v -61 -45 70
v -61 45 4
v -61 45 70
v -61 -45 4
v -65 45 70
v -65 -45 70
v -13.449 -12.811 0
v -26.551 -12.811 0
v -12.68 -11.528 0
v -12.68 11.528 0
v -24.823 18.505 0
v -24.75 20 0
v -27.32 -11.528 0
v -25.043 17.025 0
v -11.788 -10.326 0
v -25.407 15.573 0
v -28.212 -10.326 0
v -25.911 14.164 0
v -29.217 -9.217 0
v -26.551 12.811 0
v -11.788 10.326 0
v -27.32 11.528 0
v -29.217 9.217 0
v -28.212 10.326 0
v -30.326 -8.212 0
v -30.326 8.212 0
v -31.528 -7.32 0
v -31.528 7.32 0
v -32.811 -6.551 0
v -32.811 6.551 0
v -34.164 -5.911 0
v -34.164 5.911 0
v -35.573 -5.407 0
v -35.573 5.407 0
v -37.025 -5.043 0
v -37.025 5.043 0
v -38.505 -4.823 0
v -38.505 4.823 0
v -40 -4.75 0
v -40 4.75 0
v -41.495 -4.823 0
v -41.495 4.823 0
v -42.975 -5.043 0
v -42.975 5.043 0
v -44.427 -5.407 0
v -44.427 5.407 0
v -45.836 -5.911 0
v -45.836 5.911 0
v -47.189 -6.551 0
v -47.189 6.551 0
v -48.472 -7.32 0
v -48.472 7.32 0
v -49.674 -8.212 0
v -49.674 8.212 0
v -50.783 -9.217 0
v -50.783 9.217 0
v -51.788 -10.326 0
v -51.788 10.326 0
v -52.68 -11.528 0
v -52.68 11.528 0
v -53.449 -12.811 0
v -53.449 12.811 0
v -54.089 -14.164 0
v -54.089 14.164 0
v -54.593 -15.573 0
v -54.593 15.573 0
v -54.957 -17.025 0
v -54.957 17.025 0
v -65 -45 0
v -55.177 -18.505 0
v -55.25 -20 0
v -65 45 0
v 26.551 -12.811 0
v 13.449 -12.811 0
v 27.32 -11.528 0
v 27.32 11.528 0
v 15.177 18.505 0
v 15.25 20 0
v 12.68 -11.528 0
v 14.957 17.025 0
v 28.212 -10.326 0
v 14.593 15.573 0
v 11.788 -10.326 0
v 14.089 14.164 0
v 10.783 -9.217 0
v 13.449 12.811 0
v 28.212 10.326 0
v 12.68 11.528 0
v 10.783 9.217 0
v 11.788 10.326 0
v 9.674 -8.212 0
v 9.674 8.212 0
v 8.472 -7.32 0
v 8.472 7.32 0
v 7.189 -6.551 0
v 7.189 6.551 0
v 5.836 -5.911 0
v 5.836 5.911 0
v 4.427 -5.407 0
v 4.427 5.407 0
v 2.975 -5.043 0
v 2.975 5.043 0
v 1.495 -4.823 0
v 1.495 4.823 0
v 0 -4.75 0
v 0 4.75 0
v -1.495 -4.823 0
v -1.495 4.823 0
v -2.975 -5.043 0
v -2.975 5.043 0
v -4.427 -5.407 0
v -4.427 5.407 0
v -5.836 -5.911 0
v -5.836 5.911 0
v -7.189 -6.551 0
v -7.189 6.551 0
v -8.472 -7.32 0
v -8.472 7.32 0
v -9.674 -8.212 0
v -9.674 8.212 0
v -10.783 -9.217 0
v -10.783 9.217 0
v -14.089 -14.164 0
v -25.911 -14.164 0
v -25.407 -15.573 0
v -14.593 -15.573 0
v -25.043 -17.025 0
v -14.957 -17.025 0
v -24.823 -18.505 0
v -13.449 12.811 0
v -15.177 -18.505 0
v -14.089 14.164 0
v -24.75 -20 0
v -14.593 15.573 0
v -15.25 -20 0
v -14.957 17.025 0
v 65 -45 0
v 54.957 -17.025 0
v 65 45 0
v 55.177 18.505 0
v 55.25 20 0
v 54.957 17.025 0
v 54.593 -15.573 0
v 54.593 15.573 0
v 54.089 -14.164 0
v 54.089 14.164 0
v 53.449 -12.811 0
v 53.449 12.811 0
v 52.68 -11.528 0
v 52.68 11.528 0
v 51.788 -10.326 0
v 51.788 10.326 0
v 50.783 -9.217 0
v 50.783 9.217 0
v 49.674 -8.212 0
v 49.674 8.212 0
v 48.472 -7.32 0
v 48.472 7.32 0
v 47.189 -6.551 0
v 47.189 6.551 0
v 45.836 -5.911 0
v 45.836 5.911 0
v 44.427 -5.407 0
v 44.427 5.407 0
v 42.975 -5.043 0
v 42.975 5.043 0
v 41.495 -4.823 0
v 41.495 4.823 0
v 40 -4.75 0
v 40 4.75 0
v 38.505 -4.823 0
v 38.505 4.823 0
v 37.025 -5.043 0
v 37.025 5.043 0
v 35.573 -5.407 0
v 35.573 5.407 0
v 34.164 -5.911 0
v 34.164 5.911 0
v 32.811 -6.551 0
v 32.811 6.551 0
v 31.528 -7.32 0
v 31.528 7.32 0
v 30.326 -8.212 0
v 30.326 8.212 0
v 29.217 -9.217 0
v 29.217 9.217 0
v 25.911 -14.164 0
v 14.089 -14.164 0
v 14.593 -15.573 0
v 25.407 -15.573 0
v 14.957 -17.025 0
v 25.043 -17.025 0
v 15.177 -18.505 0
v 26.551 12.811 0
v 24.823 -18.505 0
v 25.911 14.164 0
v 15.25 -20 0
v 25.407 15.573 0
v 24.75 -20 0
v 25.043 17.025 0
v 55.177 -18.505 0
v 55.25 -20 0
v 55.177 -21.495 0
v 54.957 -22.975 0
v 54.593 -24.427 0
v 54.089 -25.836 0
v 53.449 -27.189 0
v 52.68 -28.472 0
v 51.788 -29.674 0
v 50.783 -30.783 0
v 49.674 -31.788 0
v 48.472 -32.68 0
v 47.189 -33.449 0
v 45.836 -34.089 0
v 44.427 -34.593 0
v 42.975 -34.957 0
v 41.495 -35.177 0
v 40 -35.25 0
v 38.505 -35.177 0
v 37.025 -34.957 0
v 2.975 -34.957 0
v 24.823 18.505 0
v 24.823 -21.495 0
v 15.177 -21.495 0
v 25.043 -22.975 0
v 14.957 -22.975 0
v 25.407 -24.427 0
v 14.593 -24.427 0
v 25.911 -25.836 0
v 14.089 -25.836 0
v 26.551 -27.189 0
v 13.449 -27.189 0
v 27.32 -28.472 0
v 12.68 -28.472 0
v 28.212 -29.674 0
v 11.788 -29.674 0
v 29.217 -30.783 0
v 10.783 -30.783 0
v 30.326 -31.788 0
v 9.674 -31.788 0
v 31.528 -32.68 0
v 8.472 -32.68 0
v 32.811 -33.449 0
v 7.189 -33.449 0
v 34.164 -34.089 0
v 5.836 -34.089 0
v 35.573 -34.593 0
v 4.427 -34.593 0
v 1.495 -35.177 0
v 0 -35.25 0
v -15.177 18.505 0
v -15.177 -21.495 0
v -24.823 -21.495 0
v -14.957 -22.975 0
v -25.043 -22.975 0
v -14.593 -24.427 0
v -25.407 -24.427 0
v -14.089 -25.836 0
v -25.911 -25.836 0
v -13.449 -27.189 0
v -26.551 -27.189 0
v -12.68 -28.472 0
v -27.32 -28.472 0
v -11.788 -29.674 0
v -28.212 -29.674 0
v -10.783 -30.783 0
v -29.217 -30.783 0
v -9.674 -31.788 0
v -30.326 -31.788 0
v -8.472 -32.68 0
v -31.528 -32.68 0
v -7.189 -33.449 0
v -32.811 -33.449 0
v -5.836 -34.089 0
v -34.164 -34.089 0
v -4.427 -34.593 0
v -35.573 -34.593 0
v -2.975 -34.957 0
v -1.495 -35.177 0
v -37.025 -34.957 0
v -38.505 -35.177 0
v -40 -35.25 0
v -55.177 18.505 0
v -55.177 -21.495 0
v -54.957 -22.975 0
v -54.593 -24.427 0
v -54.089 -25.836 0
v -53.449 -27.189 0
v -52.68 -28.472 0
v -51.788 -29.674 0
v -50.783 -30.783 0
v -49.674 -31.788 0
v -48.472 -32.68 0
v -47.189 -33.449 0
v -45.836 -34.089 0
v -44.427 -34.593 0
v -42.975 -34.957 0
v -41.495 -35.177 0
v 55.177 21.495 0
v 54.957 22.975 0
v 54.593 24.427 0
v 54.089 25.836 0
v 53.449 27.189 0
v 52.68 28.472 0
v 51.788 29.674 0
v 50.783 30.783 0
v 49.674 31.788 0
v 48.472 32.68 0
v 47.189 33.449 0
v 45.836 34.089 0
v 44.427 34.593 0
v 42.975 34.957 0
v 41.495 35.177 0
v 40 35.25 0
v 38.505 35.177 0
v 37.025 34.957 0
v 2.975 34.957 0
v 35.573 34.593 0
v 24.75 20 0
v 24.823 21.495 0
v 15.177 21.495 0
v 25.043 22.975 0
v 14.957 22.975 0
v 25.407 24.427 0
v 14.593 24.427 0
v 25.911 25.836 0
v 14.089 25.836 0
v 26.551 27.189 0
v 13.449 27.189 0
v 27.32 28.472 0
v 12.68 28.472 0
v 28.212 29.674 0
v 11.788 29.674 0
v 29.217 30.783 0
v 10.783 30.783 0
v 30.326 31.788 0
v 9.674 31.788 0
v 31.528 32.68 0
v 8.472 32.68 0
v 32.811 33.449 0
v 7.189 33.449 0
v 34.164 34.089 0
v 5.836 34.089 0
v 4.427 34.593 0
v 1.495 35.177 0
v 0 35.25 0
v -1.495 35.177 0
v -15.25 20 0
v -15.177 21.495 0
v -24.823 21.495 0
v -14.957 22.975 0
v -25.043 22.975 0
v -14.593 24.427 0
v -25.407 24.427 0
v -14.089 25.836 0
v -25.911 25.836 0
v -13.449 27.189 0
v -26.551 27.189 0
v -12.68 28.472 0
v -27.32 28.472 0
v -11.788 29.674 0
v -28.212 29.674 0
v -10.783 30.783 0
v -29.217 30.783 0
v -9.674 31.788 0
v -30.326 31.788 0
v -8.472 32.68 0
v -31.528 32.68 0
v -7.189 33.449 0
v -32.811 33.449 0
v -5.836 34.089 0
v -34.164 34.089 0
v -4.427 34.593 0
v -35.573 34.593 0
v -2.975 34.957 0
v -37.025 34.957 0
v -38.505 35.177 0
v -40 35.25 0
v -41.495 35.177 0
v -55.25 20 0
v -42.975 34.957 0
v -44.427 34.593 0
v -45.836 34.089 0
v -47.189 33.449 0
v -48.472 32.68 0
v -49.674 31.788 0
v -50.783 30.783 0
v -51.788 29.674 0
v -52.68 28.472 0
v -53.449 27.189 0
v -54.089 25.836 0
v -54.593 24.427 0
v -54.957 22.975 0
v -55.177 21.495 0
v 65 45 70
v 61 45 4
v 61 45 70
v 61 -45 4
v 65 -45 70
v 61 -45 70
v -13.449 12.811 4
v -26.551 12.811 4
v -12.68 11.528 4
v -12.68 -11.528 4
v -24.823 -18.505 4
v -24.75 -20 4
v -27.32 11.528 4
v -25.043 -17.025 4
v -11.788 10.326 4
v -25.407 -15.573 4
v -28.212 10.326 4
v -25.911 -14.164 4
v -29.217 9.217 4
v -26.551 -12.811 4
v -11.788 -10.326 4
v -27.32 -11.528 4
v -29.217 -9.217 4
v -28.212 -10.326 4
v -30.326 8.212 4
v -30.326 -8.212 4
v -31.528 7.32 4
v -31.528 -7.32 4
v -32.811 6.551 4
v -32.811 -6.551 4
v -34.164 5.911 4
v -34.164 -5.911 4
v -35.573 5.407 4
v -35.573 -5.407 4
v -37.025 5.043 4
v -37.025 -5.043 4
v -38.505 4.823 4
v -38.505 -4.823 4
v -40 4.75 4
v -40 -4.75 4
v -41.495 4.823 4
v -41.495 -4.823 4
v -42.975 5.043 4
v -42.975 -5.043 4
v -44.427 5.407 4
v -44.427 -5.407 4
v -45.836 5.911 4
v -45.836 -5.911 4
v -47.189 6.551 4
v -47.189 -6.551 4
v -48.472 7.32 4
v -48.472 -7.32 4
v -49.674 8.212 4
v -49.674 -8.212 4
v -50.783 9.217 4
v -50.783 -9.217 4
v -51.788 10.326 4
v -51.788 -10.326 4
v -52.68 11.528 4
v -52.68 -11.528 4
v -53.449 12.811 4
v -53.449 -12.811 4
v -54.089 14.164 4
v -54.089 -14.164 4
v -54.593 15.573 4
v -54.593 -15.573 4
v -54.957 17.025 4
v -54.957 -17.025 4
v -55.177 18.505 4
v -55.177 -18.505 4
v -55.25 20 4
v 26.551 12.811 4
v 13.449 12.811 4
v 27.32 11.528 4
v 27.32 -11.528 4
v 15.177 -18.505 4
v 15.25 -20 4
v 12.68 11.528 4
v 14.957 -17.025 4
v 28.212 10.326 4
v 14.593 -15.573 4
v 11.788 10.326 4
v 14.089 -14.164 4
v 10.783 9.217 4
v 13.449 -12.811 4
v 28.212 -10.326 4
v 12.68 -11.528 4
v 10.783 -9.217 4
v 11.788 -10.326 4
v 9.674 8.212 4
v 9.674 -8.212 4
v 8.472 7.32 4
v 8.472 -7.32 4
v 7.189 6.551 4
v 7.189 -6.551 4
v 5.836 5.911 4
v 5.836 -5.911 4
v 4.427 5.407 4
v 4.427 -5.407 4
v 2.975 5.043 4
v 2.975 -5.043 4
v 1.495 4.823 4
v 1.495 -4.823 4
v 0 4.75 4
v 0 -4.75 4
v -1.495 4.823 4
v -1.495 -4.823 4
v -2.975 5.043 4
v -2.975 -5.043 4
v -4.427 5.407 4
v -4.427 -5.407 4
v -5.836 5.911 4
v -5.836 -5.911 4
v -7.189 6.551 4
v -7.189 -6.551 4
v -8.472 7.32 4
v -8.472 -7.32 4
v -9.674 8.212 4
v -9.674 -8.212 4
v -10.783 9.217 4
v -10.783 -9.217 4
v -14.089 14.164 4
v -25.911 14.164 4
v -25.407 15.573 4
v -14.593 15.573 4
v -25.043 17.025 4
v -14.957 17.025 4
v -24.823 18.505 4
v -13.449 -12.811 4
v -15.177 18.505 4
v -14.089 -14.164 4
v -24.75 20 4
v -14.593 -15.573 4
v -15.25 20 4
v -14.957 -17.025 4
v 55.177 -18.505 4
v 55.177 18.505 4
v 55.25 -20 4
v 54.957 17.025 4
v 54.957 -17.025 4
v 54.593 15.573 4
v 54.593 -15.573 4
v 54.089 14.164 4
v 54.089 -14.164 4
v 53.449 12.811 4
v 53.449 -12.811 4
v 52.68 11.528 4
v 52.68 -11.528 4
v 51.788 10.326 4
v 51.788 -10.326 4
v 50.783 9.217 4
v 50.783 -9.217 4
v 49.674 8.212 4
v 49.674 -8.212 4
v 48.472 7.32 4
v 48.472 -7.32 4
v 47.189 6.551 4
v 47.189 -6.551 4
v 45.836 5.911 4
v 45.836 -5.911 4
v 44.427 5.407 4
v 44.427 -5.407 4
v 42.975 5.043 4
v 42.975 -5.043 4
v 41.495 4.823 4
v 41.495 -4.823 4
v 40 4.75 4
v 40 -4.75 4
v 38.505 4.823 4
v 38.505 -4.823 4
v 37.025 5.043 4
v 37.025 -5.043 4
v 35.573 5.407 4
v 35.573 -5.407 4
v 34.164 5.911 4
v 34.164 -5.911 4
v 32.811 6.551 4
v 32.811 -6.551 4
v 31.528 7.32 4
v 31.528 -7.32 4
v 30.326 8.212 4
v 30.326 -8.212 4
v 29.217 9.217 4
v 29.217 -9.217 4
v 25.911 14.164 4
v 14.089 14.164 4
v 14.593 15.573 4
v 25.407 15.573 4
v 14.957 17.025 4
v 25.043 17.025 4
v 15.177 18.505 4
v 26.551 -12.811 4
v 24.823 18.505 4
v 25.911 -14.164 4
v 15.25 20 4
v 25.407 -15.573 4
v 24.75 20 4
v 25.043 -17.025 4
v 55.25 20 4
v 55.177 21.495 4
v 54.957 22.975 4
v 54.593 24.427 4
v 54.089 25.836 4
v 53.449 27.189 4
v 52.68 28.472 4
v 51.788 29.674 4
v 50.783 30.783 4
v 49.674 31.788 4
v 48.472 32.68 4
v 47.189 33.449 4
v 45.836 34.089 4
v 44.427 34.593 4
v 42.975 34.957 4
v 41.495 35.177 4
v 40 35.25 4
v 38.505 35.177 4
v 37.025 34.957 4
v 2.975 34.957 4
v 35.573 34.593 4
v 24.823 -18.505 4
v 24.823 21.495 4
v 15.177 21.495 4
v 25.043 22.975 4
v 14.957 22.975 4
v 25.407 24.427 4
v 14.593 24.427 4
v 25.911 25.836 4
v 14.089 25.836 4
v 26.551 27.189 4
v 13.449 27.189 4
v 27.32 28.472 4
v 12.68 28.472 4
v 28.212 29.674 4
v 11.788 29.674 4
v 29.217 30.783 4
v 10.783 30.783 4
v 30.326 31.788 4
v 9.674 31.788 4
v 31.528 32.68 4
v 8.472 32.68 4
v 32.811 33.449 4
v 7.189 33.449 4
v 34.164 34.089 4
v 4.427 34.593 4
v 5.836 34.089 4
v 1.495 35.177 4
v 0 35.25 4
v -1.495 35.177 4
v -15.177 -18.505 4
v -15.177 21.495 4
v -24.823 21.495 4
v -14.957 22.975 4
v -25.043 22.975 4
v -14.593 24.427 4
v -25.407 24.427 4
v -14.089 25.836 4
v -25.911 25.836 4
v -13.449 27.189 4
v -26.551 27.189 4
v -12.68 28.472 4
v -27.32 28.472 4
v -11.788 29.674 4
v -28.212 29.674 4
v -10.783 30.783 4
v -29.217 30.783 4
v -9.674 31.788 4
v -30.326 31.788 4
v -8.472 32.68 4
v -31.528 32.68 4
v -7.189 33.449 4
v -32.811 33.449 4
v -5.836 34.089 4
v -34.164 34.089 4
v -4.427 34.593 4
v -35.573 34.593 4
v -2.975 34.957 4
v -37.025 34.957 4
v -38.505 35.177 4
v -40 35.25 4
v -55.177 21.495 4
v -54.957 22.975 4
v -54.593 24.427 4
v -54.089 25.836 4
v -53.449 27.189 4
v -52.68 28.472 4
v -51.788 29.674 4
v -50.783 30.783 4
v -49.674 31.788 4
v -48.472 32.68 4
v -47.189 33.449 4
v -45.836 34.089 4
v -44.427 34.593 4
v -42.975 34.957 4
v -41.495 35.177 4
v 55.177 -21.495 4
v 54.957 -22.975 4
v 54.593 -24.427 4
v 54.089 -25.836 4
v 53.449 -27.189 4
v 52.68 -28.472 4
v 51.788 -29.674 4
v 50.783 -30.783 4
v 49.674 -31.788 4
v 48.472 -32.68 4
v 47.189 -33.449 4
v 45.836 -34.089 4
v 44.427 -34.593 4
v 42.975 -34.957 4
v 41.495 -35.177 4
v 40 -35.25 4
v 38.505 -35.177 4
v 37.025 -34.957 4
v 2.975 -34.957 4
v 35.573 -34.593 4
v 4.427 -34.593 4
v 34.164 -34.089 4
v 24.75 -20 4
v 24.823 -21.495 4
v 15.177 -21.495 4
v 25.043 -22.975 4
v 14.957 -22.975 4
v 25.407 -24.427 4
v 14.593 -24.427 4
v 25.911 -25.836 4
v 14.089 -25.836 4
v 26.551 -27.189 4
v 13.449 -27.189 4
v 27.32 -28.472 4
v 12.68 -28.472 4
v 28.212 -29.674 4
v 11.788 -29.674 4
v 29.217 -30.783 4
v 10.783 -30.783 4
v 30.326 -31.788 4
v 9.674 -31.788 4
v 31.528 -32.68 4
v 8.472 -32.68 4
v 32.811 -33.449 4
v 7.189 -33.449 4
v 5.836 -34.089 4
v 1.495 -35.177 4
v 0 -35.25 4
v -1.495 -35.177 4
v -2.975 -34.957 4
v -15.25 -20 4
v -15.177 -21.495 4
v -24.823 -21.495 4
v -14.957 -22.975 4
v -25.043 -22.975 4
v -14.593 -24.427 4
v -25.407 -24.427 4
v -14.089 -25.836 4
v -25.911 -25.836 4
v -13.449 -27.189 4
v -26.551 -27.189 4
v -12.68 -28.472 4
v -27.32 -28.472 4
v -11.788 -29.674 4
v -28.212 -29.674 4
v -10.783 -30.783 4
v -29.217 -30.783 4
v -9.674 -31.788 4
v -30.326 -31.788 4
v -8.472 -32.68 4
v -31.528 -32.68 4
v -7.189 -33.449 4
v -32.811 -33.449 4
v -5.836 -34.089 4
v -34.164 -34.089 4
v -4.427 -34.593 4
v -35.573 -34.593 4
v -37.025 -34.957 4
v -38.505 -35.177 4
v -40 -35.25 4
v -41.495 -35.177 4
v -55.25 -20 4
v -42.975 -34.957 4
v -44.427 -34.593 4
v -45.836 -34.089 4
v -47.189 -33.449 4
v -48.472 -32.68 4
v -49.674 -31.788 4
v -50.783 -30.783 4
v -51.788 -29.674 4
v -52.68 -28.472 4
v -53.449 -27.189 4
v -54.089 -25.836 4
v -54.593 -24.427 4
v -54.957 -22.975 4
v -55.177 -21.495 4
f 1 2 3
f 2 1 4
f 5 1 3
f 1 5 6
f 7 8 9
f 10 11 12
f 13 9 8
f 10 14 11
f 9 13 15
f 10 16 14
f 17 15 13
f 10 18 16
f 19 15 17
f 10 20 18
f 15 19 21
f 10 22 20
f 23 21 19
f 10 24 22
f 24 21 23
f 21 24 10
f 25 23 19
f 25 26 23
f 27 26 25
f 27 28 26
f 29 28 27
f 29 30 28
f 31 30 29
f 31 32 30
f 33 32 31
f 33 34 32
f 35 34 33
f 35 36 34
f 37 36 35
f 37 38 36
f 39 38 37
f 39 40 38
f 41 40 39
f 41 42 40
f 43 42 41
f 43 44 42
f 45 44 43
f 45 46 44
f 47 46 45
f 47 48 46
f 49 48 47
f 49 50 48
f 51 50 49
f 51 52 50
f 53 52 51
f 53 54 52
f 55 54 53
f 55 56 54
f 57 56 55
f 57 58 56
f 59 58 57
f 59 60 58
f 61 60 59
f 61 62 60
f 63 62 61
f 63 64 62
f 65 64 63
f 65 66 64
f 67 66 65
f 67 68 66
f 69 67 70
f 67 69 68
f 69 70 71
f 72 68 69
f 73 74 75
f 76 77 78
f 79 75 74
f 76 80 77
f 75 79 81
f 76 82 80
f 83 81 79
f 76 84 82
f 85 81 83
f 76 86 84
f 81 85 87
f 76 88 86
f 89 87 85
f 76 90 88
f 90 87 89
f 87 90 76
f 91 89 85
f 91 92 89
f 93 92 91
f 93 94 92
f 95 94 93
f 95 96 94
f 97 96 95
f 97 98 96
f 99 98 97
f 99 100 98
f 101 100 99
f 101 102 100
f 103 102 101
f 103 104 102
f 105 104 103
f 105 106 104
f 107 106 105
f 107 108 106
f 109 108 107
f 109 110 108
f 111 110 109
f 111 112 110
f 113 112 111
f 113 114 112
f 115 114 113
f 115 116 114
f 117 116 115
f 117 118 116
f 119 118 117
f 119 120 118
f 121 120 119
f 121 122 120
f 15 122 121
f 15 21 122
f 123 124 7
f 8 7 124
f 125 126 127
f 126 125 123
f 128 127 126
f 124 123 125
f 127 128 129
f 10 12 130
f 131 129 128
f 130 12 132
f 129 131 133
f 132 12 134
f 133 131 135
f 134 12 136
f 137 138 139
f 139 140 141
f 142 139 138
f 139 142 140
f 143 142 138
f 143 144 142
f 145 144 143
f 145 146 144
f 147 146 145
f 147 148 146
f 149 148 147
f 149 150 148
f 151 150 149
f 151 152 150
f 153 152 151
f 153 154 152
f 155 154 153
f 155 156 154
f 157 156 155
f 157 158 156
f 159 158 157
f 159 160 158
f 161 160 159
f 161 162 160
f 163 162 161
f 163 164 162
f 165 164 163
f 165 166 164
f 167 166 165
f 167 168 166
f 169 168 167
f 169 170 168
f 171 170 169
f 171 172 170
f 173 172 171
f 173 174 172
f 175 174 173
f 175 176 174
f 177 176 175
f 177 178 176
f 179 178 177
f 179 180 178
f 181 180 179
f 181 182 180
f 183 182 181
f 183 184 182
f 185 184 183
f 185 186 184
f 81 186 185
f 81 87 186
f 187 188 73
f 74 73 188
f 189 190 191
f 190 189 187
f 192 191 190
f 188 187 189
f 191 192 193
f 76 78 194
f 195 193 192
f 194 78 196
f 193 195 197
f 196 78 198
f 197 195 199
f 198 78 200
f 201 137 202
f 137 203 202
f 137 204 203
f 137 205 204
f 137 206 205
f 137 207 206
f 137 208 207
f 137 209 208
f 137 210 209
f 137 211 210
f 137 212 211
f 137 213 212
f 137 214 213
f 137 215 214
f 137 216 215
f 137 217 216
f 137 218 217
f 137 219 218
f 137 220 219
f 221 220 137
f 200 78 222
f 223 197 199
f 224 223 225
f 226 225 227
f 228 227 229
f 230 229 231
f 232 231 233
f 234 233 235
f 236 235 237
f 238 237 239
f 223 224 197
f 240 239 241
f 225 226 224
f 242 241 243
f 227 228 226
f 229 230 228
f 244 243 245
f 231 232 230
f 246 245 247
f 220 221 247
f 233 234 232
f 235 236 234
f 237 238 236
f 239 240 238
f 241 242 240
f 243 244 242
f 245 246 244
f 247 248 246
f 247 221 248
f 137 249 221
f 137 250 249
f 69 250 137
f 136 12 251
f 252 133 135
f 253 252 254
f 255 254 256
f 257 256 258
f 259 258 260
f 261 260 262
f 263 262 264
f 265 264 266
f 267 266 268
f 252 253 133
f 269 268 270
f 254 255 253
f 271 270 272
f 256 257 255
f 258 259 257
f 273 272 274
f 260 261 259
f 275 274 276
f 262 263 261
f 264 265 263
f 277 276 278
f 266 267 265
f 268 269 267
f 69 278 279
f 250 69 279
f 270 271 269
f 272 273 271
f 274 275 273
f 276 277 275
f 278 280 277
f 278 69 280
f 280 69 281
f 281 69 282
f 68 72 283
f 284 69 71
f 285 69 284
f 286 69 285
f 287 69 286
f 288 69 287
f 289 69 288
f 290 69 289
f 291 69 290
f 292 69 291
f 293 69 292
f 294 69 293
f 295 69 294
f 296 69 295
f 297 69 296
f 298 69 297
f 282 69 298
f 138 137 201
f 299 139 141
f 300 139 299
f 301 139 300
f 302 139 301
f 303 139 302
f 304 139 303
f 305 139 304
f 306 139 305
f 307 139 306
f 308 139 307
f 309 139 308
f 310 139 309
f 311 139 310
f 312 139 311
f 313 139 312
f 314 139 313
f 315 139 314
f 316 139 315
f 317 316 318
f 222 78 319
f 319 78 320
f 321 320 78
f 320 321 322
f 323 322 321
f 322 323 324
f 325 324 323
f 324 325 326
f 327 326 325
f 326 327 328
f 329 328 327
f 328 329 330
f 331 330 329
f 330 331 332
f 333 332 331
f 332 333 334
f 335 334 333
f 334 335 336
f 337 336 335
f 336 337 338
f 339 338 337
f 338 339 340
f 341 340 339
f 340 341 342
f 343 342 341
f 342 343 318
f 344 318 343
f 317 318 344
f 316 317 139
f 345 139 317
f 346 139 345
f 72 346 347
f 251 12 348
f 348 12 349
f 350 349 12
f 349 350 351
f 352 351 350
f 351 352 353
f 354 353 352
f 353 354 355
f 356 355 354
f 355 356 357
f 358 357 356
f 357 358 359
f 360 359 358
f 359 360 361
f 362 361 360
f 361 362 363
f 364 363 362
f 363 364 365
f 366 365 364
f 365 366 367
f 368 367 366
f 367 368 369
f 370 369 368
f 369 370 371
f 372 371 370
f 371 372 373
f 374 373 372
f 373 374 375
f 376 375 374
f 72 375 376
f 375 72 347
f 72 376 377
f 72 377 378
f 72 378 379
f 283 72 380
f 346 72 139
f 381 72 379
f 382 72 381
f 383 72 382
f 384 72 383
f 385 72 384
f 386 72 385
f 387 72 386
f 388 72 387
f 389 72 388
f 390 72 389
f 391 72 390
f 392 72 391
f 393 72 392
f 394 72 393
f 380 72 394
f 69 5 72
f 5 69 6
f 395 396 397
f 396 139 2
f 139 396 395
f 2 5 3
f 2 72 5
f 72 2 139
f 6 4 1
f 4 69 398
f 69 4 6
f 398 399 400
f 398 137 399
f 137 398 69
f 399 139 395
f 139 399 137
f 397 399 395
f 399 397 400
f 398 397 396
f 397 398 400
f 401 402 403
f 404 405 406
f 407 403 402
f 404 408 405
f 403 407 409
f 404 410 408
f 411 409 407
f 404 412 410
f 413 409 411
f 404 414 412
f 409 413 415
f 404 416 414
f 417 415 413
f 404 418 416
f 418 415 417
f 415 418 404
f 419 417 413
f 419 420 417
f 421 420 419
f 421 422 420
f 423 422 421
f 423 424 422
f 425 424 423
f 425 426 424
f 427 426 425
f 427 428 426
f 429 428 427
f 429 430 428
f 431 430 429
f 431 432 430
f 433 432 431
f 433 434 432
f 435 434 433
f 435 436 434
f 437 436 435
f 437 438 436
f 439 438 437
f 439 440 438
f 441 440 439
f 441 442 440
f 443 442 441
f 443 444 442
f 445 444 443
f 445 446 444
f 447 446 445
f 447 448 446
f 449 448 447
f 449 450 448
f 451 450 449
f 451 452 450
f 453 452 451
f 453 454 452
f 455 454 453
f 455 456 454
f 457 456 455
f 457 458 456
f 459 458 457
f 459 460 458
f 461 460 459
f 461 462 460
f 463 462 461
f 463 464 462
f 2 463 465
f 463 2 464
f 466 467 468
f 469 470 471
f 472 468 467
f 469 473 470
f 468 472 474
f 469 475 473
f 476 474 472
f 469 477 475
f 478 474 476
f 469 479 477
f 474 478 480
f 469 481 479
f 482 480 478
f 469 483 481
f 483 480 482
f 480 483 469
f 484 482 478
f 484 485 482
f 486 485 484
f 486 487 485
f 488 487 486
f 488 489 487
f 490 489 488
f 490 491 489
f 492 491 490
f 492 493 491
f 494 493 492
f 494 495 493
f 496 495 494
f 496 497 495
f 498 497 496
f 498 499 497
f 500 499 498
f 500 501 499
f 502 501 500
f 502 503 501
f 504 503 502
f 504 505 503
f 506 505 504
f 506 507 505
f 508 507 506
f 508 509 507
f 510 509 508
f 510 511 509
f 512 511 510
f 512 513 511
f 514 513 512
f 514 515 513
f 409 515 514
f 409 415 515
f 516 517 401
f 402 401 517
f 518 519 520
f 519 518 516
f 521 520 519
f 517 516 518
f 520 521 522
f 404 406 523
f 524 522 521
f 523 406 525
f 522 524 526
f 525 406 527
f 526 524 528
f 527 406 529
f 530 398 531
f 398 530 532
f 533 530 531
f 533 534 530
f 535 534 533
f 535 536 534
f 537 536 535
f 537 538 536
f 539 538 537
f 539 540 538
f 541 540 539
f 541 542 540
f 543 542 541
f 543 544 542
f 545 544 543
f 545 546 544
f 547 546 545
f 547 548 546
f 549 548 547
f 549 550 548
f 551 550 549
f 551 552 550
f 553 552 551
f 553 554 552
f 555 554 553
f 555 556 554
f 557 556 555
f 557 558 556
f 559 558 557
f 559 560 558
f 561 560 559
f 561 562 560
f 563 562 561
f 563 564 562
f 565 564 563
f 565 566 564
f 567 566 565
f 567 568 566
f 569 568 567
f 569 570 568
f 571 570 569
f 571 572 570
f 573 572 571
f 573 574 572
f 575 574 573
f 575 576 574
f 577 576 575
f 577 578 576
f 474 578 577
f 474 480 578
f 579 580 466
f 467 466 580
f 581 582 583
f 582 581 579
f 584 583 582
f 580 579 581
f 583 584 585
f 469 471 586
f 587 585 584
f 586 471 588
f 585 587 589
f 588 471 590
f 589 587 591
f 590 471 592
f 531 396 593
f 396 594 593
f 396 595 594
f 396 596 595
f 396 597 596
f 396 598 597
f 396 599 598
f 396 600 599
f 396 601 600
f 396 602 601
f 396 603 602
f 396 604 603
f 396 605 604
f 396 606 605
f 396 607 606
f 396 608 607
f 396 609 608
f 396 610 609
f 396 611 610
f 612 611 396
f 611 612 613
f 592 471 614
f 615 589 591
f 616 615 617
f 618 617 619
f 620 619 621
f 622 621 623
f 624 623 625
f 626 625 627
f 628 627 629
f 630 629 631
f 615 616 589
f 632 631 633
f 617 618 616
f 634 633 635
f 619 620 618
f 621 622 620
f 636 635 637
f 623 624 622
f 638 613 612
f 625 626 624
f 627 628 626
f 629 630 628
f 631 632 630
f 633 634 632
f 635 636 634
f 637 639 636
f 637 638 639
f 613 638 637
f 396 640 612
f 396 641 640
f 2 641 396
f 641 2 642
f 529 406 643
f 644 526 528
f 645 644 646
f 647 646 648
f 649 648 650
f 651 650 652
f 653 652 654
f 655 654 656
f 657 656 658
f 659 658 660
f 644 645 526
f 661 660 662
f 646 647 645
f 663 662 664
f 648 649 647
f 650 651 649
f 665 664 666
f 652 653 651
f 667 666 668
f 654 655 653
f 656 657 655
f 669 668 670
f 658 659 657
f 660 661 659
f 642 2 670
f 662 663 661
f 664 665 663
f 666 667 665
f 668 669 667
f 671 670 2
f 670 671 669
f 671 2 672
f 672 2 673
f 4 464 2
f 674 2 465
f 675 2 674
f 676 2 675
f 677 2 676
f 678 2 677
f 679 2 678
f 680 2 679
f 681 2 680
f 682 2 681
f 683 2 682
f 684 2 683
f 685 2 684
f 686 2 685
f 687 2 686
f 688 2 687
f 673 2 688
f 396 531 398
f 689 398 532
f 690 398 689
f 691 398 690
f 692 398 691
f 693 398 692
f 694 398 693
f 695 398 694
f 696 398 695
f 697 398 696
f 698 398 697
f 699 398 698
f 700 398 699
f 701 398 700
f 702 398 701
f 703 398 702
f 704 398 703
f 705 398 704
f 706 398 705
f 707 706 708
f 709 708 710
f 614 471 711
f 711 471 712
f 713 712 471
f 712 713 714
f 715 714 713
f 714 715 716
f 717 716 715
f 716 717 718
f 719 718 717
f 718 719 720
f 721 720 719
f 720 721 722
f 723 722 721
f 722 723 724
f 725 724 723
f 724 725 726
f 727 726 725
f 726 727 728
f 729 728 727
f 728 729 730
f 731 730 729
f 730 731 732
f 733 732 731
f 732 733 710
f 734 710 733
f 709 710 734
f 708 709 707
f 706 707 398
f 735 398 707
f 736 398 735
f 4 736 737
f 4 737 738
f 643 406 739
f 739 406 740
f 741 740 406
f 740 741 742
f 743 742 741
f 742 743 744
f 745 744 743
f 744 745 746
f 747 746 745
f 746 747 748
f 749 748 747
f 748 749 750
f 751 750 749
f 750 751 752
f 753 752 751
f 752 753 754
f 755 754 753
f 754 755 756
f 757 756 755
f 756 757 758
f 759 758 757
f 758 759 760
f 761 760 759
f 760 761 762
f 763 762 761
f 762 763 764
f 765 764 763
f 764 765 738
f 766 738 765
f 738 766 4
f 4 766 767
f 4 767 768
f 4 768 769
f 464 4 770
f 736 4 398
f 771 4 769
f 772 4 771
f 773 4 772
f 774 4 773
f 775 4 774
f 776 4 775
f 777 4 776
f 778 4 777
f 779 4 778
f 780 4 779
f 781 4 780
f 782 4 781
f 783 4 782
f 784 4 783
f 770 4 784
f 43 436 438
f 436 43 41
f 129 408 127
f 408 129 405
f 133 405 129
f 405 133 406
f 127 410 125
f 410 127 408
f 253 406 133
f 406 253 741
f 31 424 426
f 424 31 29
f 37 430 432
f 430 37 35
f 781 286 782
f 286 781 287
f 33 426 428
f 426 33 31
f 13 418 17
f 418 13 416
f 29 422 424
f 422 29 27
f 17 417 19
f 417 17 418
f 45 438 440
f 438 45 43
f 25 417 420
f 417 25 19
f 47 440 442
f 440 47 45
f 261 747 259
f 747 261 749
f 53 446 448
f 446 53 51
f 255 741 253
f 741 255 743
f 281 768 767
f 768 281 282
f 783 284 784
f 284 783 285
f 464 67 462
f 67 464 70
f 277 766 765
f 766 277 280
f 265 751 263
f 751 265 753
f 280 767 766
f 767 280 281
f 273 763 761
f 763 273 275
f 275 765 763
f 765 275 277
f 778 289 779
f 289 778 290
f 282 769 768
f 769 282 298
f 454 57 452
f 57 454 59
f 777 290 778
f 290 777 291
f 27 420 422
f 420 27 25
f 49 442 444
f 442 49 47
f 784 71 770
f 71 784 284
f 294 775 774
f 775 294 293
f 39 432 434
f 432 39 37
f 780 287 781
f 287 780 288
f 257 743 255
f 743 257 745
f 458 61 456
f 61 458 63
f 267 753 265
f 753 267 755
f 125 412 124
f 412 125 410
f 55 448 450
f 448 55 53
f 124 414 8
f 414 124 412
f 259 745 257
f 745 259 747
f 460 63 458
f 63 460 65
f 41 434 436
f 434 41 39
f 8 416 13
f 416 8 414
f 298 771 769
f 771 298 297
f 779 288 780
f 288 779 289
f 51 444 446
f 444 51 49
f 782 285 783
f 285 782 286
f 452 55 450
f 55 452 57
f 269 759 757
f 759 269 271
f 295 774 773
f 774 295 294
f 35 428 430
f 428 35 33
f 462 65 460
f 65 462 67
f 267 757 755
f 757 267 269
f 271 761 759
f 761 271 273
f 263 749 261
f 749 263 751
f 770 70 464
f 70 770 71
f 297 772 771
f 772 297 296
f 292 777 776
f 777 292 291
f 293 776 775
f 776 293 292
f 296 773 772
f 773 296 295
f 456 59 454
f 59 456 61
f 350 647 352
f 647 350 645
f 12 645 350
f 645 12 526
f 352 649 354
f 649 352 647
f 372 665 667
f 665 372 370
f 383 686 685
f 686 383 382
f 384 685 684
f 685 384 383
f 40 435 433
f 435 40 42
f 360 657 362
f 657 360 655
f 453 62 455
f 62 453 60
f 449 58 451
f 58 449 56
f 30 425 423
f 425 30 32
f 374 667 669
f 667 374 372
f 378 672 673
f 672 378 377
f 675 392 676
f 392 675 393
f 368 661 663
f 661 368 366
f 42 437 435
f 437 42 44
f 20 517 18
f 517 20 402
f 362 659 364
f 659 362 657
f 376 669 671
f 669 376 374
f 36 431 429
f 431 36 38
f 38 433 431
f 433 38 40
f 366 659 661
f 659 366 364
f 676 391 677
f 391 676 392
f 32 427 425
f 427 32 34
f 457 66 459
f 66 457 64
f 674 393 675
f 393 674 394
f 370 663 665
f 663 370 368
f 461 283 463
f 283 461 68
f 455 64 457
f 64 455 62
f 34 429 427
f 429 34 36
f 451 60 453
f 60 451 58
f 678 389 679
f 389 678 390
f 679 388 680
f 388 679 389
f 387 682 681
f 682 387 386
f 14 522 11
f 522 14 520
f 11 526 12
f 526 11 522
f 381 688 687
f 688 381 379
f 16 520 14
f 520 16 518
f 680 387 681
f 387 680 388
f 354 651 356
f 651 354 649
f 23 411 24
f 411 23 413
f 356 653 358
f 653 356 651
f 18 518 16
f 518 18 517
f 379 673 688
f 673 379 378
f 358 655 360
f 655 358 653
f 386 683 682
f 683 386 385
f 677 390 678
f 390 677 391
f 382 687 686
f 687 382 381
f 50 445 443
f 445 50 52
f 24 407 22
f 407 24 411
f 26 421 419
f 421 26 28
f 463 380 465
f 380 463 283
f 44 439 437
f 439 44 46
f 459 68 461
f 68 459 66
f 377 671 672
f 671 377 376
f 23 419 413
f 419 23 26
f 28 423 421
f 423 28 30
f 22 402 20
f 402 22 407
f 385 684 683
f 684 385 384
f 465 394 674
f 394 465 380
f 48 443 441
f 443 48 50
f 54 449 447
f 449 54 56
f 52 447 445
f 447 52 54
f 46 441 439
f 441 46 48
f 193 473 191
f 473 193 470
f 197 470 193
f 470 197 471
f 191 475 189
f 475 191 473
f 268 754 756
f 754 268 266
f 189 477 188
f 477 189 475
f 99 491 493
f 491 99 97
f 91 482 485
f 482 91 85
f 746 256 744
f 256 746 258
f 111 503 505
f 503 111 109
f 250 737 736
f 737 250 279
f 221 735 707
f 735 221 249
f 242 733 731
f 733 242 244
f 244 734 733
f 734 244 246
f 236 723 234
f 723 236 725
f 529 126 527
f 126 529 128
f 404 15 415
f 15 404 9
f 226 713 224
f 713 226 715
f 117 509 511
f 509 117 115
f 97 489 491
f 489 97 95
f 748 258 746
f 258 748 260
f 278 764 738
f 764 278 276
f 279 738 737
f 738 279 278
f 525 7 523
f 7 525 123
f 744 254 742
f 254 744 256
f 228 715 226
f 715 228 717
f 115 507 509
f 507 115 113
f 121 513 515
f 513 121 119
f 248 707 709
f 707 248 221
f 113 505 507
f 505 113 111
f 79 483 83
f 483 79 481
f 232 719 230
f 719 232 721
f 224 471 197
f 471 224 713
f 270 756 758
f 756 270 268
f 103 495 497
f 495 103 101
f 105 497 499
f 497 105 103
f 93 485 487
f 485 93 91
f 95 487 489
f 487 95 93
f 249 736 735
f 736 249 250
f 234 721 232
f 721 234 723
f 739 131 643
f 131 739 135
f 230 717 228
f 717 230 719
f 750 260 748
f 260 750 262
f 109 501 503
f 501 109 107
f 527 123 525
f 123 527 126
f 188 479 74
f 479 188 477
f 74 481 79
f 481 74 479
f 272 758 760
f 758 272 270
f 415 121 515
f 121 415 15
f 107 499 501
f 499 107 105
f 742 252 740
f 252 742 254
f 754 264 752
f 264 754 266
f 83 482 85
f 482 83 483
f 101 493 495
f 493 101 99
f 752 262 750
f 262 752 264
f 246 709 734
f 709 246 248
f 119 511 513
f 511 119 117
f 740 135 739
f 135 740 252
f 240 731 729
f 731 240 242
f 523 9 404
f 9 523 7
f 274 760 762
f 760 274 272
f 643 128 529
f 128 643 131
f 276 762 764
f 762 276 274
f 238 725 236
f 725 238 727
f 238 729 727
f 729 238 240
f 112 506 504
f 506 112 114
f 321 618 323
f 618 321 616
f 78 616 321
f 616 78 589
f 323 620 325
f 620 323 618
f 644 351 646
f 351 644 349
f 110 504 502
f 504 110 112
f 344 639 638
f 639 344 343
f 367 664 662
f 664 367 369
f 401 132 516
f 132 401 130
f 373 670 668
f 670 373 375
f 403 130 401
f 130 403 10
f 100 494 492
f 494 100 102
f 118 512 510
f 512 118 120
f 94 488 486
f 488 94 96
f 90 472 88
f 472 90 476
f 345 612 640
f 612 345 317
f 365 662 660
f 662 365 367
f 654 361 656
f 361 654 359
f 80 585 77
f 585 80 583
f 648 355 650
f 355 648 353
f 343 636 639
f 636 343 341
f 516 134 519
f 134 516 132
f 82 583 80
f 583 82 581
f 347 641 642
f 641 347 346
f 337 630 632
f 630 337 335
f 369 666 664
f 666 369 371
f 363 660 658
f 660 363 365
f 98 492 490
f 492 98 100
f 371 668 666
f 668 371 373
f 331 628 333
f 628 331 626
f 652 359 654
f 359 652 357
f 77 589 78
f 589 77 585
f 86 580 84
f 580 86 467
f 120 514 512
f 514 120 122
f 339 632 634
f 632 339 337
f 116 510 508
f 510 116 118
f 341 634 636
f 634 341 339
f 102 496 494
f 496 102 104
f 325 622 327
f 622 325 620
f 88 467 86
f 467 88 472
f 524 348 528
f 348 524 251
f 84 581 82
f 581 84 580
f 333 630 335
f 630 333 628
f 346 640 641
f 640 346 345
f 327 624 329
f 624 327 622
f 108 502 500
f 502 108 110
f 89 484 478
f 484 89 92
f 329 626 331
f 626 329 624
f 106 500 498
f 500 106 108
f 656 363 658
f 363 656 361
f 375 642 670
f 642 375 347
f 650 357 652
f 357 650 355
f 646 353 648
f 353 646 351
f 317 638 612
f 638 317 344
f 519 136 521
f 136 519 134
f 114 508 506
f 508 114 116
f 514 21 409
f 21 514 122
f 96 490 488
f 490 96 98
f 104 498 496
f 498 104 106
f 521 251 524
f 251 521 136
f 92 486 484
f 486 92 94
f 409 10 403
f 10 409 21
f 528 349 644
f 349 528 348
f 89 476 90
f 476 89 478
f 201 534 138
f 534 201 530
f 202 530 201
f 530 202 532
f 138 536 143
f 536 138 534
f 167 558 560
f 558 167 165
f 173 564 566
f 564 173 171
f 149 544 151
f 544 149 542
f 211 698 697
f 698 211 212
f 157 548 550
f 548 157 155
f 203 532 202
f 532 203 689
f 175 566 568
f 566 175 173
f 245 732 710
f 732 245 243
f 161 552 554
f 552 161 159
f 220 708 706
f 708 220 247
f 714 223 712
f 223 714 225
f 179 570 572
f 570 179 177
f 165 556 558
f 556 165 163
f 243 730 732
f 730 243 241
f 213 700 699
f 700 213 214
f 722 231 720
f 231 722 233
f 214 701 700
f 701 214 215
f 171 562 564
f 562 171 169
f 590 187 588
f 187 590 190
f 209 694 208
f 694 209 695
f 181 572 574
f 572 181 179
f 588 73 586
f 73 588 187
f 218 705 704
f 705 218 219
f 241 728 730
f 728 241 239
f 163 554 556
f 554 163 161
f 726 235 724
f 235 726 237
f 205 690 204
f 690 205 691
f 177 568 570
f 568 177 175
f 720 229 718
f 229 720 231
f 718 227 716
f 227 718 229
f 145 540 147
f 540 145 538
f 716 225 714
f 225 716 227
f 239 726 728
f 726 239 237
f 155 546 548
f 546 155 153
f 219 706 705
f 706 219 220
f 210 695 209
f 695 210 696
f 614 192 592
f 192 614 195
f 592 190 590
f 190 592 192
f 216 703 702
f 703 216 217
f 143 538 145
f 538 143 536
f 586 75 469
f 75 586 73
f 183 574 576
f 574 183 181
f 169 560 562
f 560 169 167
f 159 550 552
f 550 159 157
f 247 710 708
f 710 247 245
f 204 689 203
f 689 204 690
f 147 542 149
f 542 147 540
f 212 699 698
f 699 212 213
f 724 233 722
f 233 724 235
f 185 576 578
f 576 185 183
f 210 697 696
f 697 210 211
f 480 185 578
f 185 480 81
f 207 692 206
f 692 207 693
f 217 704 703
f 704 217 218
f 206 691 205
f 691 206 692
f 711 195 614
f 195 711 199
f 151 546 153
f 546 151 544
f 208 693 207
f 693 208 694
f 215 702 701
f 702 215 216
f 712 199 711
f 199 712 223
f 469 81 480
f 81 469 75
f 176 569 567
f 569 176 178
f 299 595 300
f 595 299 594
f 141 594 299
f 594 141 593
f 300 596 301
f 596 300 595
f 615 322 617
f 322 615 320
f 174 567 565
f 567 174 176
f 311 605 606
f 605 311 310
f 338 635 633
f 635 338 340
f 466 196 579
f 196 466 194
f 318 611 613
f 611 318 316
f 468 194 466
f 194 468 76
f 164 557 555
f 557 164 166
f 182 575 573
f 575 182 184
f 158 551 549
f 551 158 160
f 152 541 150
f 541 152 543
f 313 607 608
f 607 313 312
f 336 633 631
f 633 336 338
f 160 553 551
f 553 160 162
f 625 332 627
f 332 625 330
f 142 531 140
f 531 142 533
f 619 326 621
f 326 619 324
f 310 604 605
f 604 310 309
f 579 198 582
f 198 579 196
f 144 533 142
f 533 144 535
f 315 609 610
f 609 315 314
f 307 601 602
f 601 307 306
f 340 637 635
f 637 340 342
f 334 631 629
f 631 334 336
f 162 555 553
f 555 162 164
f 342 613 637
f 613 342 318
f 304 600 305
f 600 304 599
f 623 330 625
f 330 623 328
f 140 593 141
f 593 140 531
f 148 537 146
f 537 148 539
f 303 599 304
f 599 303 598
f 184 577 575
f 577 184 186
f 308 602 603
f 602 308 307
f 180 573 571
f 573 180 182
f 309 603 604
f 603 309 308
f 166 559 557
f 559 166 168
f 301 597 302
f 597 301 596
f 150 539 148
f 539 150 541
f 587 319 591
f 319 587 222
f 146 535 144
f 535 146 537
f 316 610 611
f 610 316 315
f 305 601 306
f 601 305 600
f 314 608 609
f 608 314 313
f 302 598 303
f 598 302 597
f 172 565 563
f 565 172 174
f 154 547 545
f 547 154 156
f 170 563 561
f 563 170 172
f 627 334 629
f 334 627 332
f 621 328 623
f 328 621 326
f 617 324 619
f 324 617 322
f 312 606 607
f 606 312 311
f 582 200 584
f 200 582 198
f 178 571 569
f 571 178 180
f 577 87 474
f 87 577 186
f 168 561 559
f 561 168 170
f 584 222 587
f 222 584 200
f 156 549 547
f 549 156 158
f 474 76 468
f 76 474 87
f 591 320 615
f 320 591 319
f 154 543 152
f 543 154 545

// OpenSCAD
// Rack for six 50 mL conical (Falcon-type) tubes
// Print orientation: flat plate on bed, walls rising to z = 70.
// After printing, flip the part so the walls stand on the bed and the
// tube holes face upward.
//
// Units: mm. $fn = 64 for round holes.

// ---------------- Parameters ----------------
plate_x      = 130;   // plate length along X
plate_y      = 90;    // plate width along Y
plate_t      = 4;     // plate thickness (z = 0 to 4)

hole_d       = 30.5;  // through-hole diameter
hole_nx      = 3;     // holes per row along X
hole_ny      = 2;     // rows along Y
hole_pitch   = 40;    // centre-to-centre spacing (X and Y)

wall_t       = 4;     // wall thickness (Y)
wall_h       = 70;    // wall top height (z)

eps          = 0.5;   // cutter overshoot past faces

$fn = 64;

// ---------------- Model ----------------
difference() {
    union() {
        // Flat base plate
        translate([-plate_x/2, -plate_y/2, 0])
            cube([plate_x, plate_y, plate_t]);

        // Two solid walls along the long edges
        for (sx = [-1, 1])
            translate([sx > 0 ? plate_x/2 - wall_t : -plate_x/2,
                       -plate_y/2, 0])
                cube([wall_t, plate_y, wall_h]);
    }

    // Six through-holes, 2 rows x 3 columns, centred on the plate
    for (i = [0 : hole_nx - 1])
        for (j = [0 : hole_ny - 1])
            translate([(i - (hole_nx - 1)/2) * hole_pitch,
                       (j - (hole_ny - 1)/2) * hole_pitch,
                       -eps])
                cylinder(d = hole_d, h = plate_t + 2*eps);
}
